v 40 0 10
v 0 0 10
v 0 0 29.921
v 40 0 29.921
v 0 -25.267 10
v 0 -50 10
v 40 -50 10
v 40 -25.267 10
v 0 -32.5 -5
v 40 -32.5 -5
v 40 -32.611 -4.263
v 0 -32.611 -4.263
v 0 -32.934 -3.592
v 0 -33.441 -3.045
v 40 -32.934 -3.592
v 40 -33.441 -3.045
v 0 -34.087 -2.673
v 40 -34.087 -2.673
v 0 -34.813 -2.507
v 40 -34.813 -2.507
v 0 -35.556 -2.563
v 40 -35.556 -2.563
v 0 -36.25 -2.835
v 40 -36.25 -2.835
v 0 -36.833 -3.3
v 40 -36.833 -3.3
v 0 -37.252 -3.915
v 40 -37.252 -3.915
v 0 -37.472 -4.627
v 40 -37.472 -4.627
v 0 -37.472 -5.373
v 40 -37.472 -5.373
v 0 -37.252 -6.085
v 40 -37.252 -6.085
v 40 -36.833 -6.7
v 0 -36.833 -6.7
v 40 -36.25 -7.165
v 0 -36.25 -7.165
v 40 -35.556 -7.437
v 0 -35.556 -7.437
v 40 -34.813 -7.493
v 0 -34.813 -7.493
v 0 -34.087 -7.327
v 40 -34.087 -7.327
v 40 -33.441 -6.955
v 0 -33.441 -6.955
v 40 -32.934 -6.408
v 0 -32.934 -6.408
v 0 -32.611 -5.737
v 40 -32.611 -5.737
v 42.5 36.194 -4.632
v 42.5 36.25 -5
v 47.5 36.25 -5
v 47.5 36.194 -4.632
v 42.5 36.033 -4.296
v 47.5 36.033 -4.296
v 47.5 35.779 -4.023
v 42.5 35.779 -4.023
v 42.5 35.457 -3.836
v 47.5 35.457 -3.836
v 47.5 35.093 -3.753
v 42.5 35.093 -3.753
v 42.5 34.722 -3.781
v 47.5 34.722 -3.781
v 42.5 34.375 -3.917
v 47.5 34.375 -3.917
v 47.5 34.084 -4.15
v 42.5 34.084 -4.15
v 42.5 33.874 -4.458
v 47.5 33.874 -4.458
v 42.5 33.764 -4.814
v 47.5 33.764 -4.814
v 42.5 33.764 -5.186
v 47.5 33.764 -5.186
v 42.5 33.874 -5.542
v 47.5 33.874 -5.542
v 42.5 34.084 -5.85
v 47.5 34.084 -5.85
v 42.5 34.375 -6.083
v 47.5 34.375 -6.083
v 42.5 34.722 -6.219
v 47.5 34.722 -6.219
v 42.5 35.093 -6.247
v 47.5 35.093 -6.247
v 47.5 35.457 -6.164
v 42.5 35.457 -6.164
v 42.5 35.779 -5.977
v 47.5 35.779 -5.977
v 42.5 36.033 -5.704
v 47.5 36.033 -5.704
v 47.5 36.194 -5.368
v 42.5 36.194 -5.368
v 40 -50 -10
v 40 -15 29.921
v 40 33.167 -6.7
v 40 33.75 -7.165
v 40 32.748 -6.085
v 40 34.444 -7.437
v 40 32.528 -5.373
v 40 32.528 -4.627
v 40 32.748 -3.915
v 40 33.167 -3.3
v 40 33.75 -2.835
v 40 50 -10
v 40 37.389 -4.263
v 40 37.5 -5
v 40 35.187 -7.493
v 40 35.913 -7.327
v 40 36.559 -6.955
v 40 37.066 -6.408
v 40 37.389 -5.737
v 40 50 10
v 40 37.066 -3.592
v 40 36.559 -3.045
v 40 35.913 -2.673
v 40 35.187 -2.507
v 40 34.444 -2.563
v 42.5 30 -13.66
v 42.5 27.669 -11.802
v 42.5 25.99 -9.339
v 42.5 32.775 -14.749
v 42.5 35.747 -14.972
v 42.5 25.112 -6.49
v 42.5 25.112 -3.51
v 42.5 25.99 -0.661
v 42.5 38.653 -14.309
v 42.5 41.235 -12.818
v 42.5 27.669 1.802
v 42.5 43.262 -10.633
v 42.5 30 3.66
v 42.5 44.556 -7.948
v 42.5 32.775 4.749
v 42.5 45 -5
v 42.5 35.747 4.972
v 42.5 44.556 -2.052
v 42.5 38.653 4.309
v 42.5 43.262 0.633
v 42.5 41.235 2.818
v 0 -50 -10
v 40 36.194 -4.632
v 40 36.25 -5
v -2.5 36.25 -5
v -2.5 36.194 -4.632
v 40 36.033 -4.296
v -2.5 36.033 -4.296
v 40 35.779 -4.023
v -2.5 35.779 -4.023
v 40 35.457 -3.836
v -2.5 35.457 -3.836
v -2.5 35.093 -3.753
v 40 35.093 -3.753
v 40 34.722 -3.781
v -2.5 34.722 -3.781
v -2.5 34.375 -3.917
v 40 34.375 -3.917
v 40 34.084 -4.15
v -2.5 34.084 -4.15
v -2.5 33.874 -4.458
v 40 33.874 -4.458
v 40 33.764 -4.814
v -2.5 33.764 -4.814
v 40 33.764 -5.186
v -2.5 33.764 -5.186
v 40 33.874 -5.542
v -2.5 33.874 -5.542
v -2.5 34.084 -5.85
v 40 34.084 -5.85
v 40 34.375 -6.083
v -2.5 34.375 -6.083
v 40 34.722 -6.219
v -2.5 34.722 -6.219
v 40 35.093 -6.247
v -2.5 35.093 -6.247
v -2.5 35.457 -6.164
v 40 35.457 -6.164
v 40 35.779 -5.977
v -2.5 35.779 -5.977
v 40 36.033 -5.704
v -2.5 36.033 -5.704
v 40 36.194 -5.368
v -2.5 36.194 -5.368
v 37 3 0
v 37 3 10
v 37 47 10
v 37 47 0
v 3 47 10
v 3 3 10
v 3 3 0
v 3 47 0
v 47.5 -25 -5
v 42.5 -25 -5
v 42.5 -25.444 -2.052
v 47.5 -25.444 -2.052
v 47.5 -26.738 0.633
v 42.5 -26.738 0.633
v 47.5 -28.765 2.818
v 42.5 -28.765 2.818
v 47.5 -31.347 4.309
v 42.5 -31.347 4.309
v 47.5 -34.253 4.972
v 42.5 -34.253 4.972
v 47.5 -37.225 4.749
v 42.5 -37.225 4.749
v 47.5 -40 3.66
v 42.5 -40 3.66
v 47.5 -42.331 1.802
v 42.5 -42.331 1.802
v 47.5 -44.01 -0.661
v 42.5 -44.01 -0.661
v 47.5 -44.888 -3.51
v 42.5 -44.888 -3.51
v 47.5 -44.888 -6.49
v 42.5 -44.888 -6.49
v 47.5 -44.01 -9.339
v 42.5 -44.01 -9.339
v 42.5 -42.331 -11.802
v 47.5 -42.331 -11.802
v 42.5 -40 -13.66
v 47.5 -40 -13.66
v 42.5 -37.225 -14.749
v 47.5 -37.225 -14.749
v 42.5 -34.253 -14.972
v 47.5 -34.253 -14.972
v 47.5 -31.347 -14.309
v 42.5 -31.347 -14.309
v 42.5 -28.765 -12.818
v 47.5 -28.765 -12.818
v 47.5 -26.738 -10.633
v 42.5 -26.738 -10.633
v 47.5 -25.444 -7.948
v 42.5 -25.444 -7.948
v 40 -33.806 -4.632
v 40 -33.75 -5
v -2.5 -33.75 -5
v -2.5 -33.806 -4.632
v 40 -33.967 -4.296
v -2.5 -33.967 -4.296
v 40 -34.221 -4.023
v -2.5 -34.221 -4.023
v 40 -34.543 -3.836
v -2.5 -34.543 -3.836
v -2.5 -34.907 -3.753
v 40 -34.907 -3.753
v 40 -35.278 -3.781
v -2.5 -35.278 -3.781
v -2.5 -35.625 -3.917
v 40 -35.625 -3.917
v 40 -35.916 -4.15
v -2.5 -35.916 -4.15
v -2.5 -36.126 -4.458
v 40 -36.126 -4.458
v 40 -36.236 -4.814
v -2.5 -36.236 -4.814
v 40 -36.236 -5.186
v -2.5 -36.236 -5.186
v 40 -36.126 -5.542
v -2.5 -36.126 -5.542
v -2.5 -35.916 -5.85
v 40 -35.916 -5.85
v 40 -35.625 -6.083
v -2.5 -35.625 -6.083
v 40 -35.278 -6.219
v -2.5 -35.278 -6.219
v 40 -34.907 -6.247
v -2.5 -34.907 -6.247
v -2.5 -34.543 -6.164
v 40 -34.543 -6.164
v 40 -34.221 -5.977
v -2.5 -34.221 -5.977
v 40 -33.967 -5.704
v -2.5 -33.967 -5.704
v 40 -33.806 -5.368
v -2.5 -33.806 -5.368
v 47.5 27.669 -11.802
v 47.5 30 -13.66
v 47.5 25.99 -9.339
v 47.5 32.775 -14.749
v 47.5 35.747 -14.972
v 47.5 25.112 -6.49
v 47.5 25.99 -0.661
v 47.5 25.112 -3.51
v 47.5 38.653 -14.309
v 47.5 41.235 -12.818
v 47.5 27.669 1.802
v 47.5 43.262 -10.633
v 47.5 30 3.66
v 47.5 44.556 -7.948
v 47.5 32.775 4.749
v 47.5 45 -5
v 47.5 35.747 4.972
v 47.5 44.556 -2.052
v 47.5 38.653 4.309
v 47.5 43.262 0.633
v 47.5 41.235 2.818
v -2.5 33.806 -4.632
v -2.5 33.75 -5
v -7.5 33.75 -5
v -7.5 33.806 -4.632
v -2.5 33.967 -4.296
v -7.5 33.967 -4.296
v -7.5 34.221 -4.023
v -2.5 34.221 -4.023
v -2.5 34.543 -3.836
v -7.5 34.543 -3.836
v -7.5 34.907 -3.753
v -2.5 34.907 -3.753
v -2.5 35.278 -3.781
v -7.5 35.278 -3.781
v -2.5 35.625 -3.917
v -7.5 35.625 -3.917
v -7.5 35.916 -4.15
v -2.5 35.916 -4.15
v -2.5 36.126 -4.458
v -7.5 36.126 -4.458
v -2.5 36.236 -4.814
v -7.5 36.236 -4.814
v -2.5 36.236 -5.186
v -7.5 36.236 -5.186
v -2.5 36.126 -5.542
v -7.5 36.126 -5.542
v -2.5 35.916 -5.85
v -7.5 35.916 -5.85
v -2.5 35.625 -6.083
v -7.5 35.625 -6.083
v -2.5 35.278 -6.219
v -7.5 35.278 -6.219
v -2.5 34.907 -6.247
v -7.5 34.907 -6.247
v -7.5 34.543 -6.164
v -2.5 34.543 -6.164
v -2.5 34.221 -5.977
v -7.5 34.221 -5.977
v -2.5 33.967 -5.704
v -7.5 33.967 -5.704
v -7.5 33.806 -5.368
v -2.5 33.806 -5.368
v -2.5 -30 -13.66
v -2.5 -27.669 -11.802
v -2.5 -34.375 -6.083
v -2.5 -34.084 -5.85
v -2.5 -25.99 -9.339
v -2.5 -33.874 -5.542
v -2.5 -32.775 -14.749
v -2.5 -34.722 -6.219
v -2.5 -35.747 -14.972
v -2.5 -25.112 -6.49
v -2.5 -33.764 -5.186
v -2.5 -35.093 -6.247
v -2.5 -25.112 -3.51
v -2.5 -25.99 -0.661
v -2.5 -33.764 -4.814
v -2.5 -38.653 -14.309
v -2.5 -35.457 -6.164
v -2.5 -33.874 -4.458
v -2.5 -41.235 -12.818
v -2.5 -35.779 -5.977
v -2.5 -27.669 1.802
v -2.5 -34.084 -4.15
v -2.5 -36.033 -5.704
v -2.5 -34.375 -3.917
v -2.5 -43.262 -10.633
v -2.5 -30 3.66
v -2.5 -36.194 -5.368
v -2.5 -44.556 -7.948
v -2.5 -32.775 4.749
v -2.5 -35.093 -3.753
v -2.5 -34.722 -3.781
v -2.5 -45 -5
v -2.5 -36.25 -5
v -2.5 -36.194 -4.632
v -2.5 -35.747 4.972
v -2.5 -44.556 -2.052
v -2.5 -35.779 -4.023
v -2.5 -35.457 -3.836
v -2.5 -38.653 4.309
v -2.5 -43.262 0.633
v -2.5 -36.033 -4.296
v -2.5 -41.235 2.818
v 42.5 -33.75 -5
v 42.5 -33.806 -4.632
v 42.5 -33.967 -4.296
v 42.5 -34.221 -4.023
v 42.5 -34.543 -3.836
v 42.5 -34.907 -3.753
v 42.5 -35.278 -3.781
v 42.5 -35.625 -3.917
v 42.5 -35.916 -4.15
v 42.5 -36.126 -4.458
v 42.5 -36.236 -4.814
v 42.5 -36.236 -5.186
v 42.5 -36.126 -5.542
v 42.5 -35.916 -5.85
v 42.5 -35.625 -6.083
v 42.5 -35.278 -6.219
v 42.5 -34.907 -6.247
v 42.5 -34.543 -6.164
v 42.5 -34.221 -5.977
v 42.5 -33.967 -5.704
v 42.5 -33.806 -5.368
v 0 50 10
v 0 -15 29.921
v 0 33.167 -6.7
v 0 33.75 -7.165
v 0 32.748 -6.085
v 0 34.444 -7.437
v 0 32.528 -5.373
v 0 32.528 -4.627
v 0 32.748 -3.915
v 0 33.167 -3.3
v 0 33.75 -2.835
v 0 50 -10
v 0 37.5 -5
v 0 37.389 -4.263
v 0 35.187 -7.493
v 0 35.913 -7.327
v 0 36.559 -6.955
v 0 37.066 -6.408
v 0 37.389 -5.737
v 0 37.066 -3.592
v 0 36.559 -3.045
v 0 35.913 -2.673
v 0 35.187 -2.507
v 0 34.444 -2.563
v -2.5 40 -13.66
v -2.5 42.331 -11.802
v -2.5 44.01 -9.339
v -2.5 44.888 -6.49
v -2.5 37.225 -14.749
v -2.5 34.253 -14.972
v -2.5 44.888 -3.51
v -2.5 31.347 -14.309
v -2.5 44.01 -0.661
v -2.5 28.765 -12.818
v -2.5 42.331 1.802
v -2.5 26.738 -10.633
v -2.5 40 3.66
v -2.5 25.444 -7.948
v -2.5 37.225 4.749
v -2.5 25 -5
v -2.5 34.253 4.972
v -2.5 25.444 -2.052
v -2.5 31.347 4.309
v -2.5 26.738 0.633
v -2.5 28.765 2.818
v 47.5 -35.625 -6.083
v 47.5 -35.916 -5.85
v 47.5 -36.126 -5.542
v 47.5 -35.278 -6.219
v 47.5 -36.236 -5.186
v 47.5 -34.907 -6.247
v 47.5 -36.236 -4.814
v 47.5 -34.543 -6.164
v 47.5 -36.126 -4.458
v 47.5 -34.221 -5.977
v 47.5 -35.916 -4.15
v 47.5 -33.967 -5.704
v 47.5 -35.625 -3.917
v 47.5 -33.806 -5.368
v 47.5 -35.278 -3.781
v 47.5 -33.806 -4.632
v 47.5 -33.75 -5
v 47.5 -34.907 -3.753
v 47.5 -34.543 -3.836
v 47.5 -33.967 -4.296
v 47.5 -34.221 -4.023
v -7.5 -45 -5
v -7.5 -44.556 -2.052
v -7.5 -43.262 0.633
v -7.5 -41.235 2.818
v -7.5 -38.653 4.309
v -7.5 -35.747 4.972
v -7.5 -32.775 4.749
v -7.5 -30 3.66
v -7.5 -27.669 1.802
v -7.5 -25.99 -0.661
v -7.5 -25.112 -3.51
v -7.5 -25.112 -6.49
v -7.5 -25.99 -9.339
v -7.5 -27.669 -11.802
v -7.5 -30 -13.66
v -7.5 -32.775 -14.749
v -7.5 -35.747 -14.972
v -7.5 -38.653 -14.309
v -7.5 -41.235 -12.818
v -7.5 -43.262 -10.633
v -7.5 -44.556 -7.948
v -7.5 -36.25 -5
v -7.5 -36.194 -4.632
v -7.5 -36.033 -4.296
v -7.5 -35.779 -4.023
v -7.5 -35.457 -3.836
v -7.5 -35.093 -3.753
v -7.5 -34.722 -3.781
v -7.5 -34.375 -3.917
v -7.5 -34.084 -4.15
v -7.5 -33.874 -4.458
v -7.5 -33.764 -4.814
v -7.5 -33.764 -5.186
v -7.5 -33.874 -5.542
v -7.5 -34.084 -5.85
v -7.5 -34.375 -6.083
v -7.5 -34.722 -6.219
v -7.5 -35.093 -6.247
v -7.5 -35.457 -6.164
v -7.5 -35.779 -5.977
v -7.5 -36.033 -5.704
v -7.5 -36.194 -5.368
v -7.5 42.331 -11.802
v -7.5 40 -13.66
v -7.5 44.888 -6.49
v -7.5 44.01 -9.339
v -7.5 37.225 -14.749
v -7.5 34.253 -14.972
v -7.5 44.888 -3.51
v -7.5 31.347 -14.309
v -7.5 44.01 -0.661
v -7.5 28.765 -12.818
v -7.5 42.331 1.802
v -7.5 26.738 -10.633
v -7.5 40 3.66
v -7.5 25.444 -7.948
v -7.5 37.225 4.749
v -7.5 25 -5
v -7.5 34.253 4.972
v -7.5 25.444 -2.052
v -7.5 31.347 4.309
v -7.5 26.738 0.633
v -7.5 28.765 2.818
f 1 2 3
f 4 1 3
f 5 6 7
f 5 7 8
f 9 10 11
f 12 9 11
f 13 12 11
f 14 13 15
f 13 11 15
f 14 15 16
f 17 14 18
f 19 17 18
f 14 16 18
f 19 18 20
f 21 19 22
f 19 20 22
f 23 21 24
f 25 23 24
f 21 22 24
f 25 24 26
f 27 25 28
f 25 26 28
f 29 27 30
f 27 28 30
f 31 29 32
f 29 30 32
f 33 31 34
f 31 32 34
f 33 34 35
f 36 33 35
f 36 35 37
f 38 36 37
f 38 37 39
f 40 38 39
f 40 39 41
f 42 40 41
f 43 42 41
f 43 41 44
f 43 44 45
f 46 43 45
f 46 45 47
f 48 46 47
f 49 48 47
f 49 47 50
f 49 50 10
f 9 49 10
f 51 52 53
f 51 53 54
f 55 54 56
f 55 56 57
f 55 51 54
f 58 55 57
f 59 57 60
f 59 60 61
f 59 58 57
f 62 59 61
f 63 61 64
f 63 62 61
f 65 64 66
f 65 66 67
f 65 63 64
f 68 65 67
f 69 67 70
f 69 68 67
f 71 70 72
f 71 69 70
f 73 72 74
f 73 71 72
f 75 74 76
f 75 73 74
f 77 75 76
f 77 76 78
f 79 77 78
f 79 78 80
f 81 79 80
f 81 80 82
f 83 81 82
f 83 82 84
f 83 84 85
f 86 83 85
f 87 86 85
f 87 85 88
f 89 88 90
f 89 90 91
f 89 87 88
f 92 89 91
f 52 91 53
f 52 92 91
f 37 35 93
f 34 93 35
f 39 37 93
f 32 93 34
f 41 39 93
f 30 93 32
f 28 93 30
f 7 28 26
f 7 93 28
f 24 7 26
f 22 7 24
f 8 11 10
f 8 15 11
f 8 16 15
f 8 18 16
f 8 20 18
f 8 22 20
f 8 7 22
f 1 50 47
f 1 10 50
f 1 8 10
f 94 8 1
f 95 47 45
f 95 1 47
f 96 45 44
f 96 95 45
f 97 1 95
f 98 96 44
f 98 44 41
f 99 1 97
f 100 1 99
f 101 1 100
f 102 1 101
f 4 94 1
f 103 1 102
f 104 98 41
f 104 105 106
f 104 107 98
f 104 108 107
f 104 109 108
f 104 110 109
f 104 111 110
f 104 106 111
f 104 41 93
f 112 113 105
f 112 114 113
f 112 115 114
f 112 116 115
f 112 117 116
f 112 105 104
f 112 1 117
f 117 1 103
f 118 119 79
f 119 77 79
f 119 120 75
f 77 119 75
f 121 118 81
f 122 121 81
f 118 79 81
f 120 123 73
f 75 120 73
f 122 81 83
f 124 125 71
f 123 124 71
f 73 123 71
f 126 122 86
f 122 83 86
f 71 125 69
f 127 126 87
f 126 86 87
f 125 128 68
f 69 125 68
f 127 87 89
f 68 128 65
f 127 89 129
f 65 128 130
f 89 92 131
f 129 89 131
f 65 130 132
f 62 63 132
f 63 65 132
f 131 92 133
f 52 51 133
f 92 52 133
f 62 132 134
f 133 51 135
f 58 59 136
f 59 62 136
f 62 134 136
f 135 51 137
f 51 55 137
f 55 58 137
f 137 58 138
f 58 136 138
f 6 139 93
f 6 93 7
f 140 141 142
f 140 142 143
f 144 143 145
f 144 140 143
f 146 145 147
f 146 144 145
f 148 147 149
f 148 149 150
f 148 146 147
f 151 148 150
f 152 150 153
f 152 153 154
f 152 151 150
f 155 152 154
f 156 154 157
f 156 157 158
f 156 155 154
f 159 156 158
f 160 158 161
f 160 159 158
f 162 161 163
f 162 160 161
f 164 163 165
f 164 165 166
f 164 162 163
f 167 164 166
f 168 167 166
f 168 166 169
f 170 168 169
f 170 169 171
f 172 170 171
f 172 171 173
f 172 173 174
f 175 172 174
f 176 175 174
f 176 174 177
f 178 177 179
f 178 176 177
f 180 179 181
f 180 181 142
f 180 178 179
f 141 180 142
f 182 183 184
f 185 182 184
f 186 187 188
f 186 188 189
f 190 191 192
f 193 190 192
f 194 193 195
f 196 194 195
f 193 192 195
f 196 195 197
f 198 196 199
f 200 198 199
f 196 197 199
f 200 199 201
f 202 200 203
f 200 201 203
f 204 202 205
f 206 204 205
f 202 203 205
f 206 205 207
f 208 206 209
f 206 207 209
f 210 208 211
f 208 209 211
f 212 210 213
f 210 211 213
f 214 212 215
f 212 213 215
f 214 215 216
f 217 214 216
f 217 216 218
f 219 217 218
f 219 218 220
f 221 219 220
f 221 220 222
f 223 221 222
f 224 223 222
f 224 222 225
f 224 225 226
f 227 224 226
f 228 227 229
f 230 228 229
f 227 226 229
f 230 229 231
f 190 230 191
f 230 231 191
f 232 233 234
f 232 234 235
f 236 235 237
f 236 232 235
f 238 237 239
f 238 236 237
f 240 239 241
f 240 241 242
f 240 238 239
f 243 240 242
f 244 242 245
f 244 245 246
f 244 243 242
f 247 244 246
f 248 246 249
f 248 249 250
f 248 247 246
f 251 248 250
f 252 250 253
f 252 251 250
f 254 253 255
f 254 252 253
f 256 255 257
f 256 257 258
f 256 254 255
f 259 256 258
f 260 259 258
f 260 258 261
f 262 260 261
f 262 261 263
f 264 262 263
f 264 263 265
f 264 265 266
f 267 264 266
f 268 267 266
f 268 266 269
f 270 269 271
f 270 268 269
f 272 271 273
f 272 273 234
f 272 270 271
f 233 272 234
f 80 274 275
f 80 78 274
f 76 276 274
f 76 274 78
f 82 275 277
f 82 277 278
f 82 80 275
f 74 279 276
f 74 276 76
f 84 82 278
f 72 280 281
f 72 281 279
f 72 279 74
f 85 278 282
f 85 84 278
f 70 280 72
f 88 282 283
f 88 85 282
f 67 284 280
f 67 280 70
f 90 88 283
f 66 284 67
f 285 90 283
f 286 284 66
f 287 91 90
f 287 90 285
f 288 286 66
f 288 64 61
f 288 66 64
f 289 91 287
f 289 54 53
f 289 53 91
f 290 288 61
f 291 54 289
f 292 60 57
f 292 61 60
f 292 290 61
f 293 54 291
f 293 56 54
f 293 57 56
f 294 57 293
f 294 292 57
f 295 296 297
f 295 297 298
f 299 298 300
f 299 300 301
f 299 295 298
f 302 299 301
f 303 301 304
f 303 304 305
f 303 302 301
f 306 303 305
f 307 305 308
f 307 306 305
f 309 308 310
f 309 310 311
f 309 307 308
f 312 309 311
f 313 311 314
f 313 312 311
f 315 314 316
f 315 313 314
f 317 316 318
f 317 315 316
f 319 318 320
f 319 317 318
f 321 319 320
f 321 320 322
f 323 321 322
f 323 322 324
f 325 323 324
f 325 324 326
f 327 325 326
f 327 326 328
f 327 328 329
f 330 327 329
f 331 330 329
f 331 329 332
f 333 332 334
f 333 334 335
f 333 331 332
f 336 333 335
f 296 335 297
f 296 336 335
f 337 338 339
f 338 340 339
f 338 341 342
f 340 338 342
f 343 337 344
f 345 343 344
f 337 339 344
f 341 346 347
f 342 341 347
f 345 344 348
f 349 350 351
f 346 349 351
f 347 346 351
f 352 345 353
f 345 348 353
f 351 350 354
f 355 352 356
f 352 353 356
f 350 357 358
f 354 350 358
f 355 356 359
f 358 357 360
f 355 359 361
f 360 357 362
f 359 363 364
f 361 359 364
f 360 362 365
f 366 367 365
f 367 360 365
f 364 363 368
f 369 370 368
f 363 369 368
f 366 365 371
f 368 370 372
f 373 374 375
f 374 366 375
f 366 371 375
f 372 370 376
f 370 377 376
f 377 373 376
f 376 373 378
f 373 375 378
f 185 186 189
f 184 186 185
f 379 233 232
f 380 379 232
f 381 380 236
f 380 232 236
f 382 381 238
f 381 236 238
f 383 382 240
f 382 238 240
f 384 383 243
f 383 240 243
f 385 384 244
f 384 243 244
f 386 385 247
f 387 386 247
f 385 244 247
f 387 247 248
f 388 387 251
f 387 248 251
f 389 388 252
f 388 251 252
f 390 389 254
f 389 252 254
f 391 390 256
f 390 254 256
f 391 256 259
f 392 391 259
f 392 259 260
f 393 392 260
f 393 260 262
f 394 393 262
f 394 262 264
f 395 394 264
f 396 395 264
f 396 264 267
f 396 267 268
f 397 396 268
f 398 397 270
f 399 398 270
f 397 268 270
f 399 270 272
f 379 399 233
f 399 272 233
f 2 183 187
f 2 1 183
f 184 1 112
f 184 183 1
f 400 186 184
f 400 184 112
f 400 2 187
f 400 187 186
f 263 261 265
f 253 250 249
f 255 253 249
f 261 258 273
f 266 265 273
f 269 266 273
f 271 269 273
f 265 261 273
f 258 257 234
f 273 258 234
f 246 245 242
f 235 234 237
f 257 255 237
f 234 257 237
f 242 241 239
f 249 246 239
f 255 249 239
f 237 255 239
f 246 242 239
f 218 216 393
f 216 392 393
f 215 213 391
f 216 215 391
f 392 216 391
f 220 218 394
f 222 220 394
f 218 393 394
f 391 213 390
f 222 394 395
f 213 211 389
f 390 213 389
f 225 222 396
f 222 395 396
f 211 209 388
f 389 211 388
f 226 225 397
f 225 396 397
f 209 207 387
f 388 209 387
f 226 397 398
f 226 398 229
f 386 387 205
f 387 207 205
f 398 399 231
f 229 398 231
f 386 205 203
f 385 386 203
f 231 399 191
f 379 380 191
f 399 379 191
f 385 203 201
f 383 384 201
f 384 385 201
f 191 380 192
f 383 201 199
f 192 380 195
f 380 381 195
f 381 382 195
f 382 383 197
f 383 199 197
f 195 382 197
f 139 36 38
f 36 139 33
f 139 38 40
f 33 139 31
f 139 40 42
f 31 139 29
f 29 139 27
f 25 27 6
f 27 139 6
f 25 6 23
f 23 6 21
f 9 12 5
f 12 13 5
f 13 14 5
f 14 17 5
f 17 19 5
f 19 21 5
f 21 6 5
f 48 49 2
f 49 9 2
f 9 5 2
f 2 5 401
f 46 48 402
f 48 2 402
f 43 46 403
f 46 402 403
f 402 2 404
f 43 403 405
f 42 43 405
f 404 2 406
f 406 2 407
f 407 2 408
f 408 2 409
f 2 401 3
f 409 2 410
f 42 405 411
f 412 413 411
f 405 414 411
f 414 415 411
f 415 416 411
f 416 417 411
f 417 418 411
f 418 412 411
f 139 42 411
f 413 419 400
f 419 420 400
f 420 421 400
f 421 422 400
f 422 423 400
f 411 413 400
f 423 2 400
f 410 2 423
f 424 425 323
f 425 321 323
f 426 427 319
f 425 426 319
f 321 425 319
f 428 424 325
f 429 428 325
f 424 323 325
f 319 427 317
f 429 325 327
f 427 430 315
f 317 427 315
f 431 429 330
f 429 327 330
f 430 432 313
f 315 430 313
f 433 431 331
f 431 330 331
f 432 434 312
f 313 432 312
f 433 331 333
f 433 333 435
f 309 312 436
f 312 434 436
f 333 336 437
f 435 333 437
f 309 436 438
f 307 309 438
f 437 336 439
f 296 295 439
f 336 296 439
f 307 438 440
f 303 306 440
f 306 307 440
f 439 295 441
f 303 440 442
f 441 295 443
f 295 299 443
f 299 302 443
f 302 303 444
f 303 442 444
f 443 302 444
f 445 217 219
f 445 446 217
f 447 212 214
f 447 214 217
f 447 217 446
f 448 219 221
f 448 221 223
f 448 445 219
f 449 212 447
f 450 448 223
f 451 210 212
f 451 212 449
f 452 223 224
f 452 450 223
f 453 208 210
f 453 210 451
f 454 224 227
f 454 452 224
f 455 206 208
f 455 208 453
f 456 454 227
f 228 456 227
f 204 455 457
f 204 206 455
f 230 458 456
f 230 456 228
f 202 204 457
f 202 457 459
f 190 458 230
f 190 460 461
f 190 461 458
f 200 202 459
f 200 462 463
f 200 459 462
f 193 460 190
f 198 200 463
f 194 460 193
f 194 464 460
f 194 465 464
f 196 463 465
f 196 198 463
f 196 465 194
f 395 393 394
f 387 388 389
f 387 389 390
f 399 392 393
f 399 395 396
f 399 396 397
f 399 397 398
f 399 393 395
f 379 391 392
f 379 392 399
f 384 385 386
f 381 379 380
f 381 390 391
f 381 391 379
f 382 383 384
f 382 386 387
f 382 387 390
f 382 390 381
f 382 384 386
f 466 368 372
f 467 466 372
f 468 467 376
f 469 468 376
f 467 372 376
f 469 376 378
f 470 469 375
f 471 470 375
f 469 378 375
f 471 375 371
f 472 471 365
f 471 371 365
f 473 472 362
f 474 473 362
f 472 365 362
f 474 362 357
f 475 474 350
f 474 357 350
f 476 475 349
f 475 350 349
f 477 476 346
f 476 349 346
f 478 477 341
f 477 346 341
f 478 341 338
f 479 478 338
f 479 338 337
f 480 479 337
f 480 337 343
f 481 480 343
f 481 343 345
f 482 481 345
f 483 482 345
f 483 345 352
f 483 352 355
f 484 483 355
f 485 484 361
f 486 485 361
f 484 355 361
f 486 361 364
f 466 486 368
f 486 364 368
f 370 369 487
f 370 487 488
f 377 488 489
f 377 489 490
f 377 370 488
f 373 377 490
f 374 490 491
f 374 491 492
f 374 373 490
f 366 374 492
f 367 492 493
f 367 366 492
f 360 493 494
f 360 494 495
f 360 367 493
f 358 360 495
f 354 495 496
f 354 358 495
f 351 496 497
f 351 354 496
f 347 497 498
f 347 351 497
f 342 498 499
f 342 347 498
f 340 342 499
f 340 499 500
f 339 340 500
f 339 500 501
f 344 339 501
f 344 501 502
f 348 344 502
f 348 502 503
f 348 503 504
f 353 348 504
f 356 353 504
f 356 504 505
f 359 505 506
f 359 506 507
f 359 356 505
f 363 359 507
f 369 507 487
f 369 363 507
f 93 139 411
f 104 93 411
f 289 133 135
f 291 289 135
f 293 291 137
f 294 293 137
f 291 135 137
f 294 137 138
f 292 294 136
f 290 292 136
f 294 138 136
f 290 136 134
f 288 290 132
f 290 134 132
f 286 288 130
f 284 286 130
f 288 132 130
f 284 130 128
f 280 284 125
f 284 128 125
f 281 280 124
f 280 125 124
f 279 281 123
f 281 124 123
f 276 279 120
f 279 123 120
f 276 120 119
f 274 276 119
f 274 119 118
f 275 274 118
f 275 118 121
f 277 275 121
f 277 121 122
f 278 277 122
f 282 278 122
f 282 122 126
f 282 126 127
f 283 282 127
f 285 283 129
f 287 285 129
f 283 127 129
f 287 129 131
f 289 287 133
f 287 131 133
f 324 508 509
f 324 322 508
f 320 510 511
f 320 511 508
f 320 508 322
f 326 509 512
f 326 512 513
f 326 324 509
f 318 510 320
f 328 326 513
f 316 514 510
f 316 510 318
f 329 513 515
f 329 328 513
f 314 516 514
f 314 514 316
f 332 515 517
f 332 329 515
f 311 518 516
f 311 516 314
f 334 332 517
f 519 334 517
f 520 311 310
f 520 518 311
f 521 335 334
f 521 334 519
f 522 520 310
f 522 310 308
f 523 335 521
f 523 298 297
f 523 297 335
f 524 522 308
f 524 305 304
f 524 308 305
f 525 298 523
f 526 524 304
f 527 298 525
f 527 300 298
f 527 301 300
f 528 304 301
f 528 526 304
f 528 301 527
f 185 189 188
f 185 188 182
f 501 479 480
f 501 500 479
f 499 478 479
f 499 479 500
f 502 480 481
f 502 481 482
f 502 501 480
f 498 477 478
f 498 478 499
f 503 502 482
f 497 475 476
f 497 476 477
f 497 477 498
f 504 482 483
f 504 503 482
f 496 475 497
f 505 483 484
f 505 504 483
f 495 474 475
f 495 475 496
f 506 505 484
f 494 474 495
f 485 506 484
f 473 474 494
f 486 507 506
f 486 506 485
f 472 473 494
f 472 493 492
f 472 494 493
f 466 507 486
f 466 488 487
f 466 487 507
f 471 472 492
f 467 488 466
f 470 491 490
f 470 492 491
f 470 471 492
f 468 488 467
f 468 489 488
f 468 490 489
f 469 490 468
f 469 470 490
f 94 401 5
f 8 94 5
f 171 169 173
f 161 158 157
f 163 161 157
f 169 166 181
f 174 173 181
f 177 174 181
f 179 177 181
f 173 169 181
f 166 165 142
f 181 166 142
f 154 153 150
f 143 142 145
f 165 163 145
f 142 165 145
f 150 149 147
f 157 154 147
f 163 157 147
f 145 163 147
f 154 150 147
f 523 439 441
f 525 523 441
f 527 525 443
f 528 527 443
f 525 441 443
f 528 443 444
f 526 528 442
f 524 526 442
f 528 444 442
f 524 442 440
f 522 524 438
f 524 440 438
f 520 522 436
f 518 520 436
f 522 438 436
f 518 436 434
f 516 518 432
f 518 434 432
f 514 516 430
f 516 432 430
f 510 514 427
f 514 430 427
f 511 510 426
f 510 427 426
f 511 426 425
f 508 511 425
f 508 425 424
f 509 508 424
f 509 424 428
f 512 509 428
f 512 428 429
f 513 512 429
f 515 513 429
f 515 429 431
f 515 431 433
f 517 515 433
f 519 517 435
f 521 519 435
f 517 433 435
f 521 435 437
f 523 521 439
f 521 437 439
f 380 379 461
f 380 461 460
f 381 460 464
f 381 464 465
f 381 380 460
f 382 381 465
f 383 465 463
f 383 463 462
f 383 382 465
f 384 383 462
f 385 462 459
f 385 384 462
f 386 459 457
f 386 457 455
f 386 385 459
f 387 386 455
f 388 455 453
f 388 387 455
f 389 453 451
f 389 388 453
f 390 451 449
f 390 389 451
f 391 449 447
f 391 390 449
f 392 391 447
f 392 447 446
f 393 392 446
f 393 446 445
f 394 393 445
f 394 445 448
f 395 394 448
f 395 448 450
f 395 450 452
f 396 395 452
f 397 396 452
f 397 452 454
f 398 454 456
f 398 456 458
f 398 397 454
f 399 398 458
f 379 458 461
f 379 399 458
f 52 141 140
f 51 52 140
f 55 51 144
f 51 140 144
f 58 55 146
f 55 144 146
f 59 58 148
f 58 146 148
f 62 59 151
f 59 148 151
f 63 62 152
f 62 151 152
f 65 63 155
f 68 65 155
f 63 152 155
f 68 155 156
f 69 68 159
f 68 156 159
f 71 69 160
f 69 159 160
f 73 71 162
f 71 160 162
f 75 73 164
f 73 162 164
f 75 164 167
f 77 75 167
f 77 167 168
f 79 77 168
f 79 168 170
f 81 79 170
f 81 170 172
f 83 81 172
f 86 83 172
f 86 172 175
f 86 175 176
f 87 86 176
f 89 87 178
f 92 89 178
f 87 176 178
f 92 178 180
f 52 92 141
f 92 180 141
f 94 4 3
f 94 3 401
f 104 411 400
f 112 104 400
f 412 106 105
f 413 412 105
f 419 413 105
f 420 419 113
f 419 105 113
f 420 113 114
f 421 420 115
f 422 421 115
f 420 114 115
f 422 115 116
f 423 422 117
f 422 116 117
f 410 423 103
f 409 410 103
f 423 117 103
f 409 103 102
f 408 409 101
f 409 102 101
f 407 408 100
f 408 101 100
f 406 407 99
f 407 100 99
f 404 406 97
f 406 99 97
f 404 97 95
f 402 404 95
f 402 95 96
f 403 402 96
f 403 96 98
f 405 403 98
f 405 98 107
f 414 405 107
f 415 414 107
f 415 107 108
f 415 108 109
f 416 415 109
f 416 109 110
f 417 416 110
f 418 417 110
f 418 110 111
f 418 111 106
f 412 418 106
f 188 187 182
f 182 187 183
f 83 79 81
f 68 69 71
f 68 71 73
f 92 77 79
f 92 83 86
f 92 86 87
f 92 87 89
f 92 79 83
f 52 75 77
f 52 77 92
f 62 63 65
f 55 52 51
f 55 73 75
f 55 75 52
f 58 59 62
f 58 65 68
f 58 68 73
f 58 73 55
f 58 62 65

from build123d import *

# Parameters (mm, degrees)
F0_W      = 100
F0_H      = 20
F1_DEPTH  = 40
F2_R      = 2.5
F3_DEPTH  = 40.001
F4_R      = 2.5
F5_DEPTH  = 40.001
F7_DEPTH  = 40
F8_W      = 34
F8_H      = 44
F9_DEPTH  = 10
F10_R     = 1.25
F11_DEPTH = 42.5
F12_R     = 1.25
F13_DEPTH = 2.5
F14_R     = 1.25
F15_DEPTH = 42.5
F16_DEPTH = 2.5
F17_R     = 10
F17_R_2   = 1.25
F18_DEPTH = 5
F19_R     = 10
F19_R_2   = 1.25
F20_DEPTH = 5
F21_R     = 10
F21_R_2   = 1.25
F22_DEPTH = 5
F23_R     = 10
F23_R_2   = 1.25
F24_DEPTH = 5


with BuildPart() as f1:
    # F0 (on Right) → F1 (new body)
    with BuildSketch(Plane.YZ):
        Rectangle(F0_W, F0_H)
    extrude(amount=F1_DEPTH)

    # F2 (on face) → F3 (cut, through all)
    with BuildSketch(Plane.YZ.offset(40)):
        with Locations((35, -5)):
            Circle(F2_R)
    extrude(amount=-F3_DEPTH, mode=Mode.SUBTRACT)

    # F4 (on face) → F5 (cut, through all)
    with BuildSketch(Plane.YZ.offset(40)):
        with Locations((-35, -5)):
            Circle(F4_R)
    extrude(amount=-F5_DEPTH, mode=Mode.SUBTRACT)

    # F6 (on Right) → F7 (join)
    with BuildSketch(Plane.YZ):
        Polygon((-25.30775, 9.9211579347), (0, 9.9211651832), (0, 29.9211651832), (-15, 29.9211651832), align=None)
    extrude(amount=F7_DEPTH)

    # F8 (on face) → F9 (cut)
    with BuildSketch(Plane.XY.offset(10)):
        with Locations((20, 25)):
            Rectangle(F8_W, F8_H)
    extrude(amount=-F9_DEPTH, mode=Mode.SUBTRACT)


with BuildPart() as f11:
    # F10 (on face) → F11 (new body)
    with BuildSketch(Plane.YZ.offset(40)):
        with Locations((35, -5)):
            Circle(F10_R)
    extrude(amount=-F11_DEPTH)

    # F12 (on face) → F13 (join)
    with BuildSketch(Plane.YZ.offset(40)):
        with Locations((35, -5)):
            Circle(F12_R)
    extrude(amount=F13_DEPTH)


with BuildPart() as f15:
    # F14 (on face) → F15 (new body)
    with BuildSketch(Plane.YZ.offset(40)):
        with Locations((-35, -5)):
            Circle(F14_R)
    extrude(amount=-F15_DEPTH)

    # F16 (add): a face of the model
    f16_faces = [f15.faces().sort_by_distance(p)[0] for p in [
        (40, -35, -5),
    ]]
    extrude(f16_faces, amount=F16_DEPTH)

    # F17 (on face) → F18 (join)
    with BuildSketch(Plane.YZ.offset(42.5)):
        with Locations((-35, -5)):
            Circle(F17_R)
        with Locations((-35, -5)):
            Circle(F17_R_2, mode=Mode.SUBTRACT)
    extrude(amount=F18_DEPTH)


with BuildPart() as f20:
    # F19 (on face) → F20 (new body)
    with BuildSketch(Plane.YZ.offset(42.5)):
        with Locations((35, -5)):
            Circle(F19_R)
        with Locations((35, -5)):
            Circle(F19_R_2, mode=Mode.SUBTRACT)
    extrude(amount=F20_DEPTH)


with BuildPart() as f22:
    # F21 (on face) → F22 (new body)
    with BuildSketch(Plane(origin=(-2.5, 0, 0), x_dir=(0, -1, 0), z_dir=(-1, 0, 0))):
        with Locations((-35, -5)):
            Circle(F21_R)
        with Locations((-35, -5)):
            Circle(F21_R_2, mode=Mode.SUBTRACT)
    extrude(amount=F22_DEPTH)


with BuildPart() as f24:
    # F23 (on face) → F24 (new body)
    with BuildSketch(Plane(origin=(-2.5, 0, 0), x_dir=(0, -1, 0), z_dir=(-1, 0, 0))):
        with Locations((35, -5)):
            Circle(F23_R)
        with Locations((35, -5)):
            Circle(F23_R_2, mode=Mode.SUBTRACT)
    extrude(amount=F24_DEPTH)


solid = Compound([f1.part, f11.part, f15.part, f20.part, f22.part, f24.part])
